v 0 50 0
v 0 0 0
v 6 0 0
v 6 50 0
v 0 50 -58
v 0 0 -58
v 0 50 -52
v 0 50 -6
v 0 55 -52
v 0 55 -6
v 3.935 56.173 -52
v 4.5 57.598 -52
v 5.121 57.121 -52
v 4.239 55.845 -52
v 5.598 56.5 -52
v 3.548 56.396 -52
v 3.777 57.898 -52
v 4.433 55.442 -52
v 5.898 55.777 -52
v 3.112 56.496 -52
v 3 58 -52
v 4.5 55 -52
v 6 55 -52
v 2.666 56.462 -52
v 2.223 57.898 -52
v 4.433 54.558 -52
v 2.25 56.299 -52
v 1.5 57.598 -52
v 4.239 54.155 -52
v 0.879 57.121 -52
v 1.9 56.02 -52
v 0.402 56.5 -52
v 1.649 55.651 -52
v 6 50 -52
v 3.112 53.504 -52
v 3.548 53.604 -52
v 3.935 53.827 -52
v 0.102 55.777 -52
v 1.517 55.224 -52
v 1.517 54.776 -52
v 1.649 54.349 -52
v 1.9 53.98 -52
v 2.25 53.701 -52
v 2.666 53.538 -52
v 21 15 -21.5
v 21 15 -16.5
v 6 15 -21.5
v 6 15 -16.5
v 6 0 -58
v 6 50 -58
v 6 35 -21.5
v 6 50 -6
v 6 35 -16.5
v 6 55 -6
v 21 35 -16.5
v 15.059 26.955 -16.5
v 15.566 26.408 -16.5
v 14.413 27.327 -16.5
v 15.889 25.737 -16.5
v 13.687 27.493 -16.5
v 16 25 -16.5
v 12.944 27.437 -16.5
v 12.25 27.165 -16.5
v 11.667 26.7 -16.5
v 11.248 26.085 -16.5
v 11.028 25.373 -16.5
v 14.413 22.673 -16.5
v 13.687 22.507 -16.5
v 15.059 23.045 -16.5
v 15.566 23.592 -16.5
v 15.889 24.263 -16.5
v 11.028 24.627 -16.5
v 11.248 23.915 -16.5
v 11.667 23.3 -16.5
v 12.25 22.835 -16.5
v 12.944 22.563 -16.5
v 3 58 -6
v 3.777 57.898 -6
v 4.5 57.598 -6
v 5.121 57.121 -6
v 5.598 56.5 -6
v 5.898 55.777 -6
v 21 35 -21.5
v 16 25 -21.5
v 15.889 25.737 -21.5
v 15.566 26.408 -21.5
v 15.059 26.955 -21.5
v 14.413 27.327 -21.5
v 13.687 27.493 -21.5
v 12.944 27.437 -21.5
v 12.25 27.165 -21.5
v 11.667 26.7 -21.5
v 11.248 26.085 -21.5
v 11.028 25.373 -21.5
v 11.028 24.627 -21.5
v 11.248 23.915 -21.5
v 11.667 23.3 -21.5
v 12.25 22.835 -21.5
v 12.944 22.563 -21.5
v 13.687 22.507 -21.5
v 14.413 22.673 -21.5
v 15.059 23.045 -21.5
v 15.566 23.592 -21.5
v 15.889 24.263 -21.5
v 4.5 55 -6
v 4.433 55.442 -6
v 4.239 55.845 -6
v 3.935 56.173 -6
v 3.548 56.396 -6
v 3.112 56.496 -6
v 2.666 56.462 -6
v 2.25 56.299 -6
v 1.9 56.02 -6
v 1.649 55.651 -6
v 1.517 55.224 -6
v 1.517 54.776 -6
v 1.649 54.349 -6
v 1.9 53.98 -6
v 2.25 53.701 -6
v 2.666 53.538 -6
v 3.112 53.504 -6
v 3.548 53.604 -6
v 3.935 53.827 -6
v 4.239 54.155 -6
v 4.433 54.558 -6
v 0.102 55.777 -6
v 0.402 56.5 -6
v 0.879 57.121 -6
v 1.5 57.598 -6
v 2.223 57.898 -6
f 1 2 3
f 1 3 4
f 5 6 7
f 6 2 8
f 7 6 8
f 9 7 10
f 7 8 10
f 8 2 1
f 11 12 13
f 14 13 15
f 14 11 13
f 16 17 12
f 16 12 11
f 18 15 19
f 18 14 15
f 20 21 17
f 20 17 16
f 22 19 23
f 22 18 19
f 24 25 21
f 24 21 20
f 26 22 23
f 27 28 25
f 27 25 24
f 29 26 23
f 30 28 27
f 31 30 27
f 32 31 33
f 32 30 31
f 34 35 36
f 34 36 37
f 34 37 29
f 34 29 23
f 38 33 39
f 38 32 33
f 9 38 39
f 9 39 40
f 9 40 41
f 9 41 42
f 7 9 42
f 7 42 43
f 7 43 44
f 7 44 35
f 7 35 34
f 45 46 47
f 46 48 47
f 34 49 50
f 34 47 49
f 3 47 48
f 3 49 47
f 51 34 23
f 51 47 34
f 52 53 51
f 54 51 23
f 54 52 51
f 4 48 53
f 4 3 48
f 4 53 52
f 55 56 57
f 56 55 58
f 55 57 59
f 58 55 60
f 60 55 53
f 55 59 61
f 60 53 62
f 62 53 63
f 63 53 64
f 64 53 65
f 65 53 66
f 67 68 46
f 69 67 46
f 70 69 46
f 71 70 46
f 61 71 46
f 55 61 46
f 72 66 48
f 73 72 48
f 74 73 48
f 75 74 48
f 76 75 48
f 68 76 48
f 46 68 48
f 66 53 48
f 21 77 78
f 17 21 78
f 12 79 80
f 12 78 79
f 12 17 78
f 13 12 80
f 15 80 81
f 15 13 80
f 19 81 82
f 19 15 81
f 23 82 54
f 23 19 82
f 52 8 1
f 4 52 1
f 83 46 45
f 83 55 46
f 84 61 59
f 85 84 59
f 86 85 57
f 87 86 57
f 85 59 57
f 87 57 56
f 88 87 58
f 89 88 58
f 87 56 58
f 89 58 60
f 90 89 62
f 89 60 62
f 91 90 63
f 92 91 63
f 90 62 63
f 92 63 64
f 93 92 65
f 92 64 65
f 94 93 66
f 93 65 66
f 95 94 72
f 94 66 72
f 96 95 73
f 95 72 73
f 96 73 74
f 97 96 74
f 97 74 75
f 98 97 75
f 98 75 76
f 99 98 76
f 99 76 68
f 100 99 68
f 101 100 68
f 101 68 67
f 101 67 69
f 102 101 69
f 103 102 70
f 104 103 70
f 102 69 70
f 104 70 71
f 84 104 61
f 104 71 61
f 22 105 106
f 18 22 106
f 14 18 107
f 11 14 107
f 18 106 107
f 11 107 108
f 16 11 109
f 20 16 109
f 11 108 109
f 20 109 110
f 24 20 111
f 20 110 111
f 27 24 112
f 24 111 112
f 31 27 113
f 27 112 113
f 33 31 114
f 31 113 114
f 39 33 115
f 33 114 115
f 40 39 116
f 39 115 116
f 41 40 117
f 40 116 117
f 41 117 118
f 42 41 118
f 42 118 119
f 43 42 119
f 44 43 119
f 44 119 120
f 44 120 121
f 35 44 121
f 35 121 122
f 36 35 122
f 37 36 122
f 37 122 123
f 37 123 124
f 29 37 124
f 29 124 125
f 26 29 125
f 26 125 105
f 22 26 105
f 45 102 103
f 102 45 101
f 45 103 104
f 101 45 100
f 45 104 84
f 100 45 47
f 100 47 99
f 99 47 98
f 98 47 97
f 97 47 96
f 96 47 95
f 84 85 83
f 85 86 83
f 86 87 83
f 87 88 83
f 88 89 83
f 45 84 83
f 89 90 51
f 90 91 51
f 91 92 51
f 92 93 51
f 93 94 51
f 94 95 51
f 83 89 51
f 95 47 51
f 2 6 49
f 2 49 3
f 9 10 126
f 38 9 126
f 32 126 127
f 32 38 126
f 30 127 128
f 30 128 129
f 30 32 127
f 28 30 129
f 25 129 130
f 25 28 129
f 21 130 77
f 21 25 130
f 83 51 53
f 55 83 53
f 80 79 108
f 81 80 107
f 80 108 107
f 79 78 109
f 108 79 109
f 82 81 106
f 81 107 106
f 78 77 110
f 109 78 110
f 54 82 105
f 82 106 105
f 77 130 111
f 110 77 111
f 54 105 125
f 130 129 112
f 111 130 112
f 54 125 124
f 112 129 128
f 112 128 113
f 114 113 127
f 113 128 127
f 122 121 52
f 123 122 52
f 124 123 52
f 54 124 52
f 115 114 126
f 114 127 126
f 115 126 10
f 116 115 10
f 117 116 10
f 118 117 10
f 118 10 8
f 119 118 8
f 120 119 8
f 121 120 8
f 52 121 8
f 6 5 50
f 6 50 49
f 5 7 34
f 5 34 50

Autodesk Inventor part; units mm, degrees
ref_plane "YZ Plane" through (0, 0, 0) normal (1, 0, 0) x (0, 1, 0)
ref_plane "XZ Plane" through (0, 0, 0) normal (0, 1, 0) x (-1, 0, 0)
ref_plane "XY Plane" through (0, 0, 0) normal (0, 0, 1) x (1, 0, 0)
sketch "Esquisse1" plane through (0, 0, 0) normal (1, 0, 0) x (0, 1, 0)
  line L0 (0, 0) -> (58, 0)
  line L1 (58, 0) -> (58, -58)
  line L2 (58, -58) -> (0, -58)
  line L3 (0, -58) -> (0, 0)
  line L4 (50, 0) -> (58, 0)
  line L5 (58, 0) -> (58, -6)
  line L6 (58, -6) -> (50, -6)
  line L7 (50, -6) -> (50, 0)
  line L8 (58, -52) -> (50, -52)
  line L9 (50, -52) -> (50, -58)
  line L10 (50, -58) -> (58, -58)
  line L11 (58, -58) -> (58, -52)
  dimension "d0" = 58
  dimension "d1" = 58
  dimension "d2" = 6
  dimension "d3" = 8
  dimension "d4" = 8
  dimension "d5" = 6
  dimension "d15" = 46
extrude "Extrusion1" add sketch "Esquisse1" along normal blind 6 contours L0 L7 L6 L1 L8 L9 L2 L3
sketch "Esquisse2" plane through (0, 50, -6) normal (0, 0, 1) x (1, 0, 0)
  circle A0 centre (3, 5) radius 1.5
  line L0 (6, 8) -> (6, 0) projected
  line L1 (0, 8) -> (0, 0) projected
  line L2 (0, 0) -> (6, 0) projected
  line L3 (0, 8) -> (6, 8) projected
  point P0 (0, -50)
  dimension "d8" = 3
  dimension "d9" = 6
  dimension "d10" = 8
  dimension "d11" = 3
  dimension "d32" = 3
extrude "Extrusion2" cut sketch "Esquisse2" against normal up to next contours A0
sketch "Esquisse3" plane through (6, 0, 0) normal (1, 0, 0) x (0, 0, -1)
  line L0 (16.5, 15) -> (21.5, 15)
  line L1 (21.5, 15) -> (21.5, 35)
  line L2 (21.5, 35) -> (16.5, 35)
  line L3 (16.5, 35) -> (16.5, 15)
  line L4 (0, 50) -> (0, 0) projected
  line L5 (0, 0) -> (58, 0) projected
  line L6 (6, 50) -> (0, 50) projected
  dimension "d16" = 5
  dimension "d17" = 20
  dimension "d18" = 16.5
  dimension "d19" = 15
  dimension "d20" = 50
  dimension "d21" = 58
extrude "Extrusion3" add sketch "Esquisse3" along normal blind 15
sketch "Esquisse4" plane through (6, 15, -16.5) normal (0, 0, 1) x (1, 0, 0)
  circle A0 centre (7.5, 10) radius 2.5
  line L0 (0, 20) -> (15, 20) projected
  line L1 (0, 0) -> (15, 0) projected
  line L2 (15, 20) -> (15, 0) projected
  line L3 (0, 35) -> (0, -15) projected
  point P0 (-6, -15)
  dimension "d24" = 5
  dimension "d25" = 20
  dimension "d26" = 15
  dimension "d27" = 7.5
  dimension "d28" = 10
extrude "Extrusion4" cut sketch "Esquisse4" against normal up to next contours A0
fillet "Congé1" radius 3 2 edges at (6, 58, -29) (0, 58, -29)
equation "\"d5\" = d2"
equation "\"d11\" = 0.5 * d9"
equation "\"d19\" = 0.5 * d20 - 0.5 * d17"
equation "\"d27\" = 0.5 * d26"
equation "\"d28\" = 0.5 * d25"
properties part number "membre_pince" material "Plastique PC/ABS"
